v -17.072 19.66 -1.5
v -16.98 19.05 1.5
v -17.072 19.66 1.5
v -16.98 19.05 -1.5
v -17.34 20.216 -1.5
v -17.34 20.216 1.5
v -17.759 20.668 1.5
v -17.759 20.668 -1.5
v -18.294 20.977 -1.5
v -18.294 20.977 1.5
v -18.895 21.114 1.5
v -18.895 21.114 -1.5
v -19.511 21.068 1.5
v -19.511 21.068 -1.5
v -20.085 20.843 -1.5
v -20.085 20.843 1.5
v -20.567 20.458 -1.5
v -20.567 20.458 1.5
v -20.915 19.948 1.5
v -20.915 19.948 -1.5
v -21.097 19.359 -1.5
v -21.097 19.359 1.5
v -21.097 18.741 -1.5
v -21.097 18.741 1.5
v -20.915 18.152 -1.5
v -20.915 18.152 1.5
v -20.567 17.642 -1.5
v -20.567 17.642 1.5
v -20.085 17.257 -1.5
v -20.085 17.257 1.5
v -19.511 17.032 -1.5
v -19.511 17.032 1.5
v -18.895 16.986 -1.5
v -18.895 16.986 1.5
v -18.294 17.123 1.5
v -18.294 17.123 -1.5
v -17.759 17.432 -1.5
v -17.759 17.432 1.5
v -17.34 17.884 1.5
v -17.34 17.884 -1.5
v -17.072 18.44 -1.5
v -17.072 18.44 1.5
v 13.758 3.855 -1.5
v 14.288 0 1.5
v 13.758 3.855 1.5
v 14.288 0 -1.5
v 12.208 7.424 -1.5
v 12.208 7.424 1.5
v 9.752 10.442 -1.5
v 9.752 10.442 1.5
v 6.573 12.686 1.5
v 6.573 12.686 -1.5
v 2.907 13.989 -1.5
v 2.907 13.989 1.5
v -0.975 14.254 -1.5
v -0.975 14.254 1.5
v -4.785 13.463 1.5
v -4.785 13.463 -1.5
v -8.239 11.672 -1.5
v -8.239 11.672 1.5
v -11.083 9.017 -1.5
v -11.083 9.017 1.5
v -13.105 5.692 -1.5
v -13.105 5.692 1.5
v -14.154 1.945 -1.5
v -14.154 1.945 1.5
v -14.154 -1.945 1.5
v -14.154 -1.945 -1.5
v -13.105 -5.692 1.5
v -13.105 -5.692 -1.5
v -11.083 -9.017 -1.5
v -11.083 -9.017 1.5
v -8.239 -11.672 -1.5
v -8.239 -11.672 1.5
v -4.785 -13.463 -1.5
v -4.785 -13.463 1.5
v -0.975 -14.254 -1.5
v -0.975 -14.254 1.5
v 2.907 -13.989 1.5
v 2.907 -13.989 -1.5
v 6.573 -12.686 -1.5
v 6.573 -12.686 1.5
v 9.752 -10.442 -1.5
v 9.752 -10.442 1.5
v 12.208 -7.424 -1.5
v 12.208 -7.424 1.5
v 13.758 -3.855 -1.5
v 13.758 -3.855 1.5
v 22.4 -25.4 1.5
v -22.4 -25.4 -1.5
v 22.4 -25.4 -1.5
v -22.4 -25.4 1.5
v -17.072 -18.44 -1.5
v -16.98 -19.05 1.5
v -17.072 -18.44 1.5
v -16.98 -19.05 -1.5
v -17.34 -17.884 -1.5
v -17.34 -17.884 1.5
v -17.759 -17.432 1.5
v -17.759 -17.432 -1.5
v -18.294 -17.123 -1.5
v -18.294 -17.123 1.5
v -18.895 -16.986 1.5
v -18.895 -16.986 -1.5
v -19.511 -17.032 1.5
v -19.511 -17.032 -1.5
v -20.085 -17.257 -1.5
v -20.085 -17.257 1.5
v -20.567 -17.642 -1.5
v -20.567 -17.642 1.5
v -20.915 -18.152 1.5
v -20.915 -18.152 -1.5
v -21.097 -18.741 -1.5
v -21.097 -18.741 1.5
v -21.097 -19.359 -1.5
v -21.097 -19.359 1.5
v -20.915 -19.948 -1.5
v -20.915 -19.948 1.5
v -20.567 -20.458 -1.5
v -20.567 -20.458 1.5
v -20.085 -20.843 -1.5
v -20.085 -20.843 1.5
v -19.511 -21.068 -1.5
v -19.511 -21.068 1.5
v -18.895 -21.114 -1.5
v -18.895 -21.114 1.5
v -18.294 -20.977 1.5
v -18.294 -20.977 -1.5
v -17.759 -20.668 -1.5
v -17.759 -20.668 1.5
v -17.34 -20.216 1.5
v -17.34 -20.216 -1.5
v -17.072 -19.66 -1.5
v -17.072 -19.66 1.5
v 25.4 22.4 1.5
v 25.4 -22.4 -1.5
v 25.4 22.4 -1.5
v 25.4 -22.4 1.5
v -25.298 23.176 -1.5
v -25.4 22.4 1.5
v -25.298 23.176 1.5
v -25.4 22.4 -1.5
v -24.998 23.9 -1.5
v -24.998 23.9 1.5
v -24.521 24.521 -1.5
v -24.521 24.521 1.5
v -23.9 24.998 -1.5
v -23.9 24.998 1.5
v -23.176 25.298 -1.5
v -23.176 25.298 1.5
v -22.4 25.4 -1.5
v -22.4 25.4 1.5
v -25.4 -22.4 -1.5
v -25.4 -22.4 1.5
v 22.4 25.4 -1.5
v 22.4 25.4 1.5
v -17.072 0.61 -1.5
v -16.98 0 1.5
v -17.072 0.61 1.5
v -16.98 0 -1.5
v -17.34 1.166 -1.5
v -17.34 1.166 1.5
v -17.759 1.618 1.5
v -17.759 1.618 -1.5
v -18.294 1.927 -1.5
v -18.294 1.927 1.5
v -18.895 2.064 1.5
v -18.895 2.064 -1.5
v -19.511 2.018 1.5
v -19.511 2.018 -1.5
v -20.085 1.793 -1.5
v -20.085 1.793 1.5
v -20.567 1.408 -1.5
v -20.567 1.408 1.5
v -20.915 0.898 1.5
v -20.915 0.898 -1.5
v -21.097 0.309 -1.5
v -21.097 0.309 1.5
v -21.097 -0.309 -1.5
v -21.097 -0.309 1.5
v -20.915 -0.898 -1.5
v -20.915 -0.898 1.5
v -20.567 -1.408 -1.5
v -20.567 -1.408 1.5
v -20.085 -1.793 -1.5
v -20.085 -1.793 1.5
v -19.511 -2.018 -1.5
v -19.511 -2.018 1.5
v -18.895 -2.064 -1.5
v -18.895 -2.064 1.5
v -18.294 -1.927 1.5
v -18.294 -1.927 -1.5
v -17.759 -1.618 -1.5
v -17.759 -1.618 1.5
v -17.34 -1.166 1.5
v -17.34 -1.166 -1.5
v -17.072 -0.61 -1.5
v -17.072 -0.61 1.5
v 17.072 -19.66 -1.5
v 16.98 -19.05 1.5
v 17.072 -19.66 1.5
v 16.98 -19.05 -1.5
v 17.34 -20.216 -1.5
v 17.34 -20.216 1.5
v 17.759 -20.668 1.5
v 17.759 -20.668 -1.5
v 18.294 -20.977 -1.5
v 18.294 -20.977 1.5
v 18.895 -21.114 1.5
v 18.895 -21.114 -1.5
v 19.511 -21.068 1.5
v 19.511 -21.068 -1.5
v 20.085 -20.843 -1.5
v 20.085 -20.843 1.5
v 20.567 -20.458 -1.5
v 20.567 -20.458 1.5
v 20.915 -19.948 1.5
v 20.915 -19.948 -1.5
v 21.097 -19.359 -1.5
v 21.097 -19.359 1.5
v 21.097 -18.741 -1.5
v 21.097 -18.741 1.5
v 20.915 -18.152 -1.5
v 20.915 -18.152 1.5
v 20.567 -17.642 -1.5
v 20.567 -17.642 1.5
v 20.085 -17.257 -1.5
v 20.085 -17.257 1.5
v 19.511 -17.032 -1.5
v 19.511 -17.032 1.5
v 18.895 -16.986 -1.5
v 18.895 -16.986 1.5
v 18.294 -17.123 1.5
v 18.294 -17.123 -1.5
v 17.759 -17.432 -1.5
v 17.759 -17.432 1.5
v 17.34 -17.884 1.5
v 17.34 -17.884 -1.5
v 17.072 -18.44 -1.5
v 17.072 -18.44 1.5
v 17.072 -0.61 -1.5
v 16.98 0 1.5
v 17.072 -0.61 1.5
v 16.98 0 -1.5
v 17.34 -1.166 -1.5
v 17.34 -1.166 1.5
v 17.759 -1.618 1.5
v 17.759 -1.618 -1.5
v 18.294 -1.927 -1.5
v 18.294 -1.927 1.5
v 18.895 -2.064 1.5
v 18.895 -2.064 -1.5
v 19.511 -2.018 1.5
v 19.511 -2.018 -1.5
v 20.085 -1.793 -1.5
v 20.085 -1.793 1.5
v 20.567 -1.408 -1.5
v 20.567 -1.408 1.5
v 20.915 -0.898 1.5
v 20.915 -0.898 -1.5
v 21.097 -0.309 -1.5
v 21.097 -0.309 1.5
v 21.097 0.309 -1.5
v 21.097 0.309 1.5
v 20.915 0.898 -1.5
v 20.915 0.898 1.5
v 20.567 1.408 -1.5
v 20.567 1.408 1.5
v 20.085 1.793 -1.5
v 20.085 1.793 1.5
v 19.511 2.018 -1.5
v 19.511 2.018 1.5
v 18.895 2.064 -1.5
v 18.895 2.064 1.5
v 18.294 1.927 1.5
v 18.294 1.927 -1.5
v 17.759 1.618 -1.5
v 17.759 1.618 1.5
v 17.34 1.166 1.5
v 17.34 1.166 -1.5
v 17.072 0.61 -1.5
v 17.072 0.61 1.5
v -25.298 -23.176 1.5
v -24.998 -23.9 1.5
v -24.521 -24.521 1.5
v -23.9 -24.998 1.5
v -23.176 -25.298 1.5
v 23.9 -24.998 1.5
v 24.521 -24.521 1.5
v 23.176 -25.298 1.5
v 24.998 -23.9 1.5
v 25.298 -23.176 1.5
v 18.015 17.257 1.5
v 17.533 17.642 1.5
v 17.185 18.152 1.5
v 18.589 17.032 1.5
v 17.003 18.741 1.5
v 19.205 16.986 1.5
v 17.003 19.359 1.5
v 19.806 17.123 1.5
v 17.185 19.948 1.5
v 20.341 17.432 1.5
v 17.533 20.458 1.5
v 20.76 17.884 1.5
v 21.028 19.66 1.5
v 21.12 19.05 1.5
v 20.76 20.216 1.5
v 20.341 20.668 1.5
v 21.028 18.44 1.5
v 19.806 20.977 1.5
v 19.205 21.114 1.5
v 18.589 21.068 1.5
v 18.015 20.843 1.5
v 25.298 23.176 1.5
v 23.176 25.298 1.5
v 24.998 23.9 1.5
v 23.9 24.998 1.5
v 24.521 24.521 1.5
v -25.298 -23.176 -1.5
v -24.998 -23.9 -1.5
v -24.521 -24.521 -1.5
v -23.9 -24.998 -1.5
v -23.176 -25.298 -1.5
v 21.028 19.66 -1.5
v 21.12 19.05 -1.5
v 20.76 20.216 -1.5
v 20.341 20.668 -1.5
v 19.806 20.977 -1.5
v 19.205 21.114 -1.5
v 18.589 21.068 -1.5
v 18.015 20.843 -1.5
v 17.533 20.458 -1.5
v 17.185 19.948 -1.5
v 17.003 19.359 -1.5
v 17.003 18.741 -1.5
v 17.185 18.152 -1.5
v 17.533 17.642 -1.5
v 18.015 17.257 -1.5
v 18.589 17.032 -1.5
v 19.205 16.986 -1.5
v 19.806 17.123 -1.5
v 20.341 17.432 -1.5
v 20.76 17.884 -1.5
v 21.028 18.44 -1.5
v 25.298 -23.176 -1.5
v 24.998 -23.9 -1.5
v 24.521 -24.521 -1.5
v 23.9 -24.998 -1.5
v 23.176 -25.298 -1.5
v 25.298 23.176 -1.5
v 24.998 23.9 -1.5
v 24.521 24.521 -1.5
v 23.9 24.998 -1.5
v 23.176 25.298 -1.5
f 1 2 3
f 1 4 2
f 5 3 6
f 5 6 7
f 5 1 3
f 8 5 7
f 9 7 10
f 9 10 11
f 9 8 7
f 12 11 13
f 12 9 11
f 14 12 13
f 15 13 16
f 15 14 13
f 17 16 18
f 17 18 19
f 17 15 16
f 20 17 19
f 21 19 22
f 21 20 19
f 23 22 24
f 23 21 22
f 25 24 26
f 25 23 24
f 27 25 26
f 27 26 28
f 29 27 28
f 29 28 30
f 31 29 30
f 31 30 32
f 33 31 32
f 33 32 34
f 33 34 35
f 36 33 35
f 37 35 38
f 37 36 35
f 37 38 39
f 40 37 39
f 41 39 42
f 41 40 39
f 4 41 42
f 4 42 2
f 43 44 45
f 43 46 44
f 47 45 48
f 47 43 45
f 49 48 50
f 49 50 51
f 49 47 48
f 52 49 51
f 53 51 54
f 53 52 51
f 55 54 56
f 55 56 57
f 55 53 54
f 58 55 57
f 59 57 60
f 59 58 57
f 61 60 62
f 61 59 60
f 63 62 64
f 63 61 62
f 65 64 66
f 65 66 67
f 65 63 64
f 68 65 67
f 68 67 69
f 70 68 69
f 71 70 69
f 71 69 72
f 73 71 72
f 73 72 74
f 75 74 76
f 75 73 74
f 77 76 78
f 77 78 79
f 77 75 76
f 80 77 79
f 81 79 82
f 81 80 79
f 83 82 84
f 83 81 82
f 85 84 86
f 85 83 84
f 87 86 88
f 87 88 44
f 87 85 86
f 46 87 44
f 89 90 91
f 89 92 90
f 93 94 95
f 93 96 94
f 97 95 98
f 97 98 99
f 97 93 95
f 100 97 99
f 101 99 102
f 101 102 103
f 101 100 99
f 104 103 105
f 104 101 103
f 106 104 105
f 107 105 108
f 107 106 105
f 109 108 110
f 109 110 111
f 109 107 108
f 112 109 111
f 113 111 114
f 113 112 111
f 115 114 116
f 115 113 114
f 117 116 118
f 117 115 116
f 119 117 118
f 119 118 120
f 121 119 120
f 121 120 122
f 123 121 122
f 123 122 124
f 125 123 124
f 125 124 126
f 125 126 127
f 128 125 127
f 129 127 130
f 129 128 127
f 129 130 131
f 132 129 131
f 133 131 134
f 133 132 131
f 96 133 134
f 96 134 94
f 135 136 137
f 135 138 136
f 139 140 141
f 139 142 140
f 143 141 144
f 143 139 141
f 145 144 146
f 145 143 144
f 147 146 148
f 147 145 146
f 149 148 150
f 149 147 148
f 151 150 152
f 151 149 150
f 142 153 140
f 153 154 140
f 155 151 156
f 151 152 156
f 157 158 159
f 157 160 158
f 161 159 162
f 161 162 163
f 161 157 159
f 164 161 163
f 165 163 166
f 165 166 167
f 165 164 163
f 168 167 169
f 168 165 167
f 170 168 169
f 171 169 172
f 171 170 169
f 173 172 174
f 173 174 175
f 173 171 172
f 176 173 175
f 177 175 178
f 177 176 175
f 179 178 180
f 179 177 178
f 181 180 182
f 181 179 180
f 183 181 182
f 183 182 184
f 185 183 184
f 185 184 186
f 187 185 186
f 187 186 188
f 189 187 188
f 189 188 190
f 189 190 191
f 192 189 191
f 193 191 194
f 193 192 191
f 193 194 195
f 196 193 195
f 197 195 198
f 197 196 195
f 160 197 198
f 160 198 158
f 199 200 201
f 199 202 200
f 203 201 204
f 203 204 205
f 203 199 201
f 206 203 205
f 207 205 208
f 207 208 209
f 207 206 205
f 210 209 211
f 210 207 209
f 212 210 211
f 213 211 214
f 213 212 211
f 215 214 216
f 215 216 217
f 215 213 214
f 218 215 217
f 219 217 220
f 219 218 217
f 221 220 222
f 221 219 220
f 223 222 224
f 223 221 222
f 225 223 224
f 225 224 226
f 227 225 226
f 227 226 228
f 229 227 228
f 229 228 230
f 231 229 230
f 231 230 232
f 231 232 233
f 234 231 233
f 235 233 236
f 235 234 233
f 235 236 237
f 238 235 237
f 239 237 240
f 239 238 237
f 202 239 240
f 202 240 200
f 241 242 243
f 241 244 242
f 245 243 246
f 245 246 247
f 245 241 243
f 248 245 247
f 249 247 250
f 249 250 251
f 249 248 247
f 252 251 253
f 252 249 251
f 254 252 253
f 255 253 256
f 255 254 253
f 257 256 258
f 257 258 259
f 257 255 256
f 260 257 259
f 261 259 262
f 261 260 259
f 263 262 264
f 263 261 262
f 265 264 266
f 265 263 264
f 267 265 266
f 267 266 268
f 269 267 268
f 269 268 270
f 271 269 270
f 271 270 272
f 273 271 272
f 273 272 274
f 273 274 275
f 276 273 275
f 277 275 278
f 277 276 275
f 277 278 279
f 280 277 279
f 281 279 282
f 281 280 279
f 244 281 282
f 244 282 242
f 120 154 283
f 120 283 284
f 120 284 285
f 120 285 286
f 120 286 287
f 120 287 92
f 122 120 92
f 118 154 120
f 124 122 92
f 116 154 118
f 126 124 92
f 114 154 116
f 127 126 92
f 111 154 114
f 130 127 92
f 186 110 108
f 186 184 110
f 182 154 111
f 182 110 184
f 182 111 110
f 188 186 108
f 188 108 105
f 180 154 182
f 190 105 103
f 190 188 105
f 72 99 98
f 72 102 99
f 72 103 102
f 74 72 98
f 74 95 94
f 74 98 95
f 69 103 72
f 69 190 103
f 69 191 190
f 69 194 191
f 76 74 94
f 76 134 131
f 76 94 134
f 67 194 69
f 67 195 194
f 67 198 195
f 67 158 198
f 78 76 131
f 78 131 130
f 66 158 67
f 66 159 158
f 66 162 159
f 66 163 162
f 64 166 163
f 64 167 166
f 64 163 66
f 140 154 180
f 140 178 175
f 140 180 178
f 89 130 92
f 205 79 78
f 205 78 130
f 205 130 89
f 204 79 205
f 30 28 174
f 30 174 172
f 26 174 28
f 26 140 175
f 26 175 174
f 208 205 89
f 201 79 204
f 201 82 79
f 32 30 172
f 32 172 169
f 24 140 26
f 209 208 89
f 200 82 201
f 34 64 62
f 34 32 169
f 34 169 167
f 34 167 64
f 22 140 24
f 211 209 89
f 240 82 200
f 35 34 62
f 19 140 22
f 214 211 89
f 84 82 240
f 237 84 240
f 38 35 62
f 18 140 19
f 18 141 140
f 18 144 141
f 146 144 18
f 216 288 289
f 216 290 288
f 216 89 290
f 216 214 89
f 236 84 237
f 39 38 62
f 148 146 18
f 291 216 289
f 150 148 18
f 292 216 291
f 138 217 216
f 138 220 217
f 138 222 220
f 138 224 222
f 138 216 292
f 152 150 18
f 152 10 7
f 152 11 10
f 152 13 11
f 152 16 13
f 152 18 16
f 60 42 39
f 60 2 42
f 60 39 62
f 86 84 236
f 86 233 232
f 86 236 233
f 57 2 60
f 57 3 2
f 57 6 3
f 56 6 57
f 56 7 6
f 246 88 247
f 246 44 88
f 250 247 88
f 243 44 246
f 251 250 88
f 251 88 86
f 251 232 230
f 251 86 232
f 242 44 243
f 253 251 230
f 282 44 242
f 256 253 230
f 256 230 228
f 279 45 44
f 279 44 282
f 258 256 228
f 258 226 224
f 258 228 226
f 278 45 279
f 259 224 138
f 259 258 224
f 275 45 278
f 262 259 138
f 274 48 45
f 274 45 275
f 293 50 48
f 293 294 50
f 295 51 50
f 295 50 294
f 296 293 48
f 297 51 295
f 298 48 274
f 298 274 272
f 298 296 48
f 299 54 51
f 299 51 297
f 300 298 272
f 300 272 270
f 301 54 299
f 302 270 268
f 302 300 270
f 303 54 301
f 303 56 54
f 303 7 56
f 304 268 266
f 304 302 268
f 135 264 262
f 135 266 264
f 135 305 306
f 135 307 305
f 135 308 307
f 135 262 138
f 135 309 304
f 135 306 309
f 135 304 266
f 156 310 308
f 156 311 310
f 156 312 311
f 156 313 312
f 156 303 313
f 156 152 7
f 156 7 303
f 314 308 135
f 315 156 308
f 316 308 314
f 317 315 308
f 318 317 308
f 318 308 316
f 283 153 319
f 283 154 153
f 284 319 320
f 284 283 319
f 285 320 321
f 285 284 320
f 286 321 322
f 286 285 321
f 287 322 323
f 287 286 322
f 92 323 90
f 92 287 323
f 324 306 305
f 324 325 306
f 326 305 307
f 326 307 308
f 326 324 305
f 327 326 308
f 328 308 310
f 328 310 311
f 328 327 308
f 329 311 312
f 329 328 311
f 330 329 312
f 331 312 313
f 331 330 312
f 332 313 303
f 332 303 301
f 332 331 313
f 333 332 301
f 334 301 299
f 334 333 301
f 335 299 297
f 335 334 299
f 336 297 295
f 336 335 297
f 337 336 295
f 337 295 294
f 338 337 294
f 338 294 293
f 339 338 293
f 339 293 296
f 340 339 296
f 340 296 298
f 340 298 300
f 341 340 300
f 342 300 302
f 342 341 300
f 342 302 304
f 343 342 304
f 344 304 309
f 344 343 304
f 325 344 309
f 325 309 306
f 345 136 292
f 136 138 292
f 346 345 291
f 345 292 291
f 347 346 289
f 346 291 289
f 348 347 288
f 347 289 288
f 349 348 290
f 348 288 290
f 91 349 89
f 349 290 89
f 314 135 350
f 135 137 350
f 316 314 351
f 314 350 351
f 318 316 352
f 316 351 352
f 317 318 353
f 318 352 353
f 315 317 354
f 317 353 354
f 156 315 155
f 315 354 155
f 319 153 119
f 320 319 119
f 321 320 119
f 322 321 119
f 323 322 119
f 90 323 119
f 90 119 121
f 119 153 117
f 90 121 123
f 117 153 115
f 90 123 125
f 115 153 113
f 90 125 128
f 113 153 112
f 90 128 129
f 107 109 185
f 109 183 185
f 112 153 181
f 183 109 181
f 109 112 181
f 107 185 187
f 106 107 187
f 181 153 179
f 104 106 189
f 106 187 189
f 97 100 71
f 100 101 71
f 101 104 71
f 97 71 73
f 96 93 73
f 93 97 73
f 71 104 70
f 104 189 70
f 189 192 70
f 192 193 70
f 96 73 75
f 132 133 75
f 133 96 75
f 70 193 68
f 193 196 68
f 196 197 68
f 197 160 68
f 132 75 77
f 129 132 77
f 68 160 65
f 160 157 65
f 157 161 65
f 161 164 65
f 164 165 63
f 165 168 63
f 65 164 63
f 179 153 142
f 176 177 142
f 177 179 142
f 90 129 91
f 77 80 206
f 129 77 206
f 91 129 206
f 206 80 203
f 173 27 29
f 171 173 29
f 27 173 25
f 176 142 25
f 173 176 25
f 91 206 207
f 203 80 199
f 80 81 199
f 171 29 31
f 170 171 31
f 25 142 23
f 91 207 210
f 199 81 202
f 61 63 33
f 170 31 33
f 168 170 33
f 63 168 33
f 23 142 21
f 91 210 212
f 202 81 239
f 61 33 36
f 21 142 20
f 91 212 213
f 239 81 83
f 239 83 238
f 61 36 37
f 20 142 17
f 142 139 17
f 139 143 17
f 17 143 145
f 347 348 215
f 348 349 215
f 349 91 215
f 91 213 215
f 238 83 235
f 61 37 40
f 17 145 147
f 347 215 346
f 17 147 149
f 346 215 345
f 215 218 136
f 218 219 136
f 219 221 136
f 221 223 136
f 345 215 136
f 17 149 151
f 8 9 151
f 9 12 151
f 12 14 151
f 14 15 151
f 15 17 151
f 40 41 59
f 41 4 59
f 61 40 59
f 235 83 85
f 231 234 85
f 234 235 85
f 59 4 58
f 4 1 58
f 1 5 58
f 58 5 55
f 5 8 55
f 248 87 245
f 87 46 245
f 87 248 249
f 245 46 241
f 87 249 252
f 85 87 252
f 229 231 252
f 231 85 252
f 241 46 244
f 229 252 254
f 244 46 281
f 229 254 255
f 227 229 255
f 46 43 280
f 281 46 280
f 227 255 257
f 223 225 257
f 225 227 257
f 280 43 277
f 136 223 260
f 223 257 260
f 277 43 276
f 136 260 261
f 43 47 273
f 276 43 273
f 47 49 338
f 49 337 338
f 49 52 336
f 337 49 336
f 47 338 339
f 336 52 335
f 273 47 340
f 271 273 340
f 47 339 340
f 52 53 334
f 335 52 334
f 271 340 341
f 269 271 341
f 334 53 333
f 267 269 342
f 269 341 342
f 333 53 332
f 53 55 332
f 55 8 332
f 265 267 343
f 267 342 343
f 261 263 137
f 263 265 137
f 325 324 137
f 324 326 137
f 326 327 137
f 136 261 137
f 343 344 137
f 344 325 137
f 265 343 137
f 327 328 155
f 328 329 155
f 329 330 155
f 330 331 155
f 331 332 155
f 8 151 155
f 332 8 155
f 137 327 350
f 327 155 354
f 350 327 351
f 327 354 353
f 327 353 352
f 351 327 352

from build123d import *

# Parameters (mm, degrees)
SKETCH1_W           = 50.8
SKETCH1_H           = 50.8
SKETCH1_R           = 14.2875
SKETCH1_R_2         = 2.07
BOSS_EXTRUDE1_DEPTH = 1.5
FILLET1_R           = 3


with BuildPart() as part:
    # Sketch1 → Boss-Extrude1 (new, symmetric)
    with BuildSketch(Plane.XY):
        Rectangle(SKETCH1_W, SKETCH1_H)
        Circle(SKETCH1_R, mode=Mode.SUBTRACT)
        with Locations((-19.05, 19.05)):
            Circle(SKETCH1_R_2, mode=Mode.SUBTRACT)
        with Locations(Location((19.05, -19.05, 0), (0, 0, 180))):
            Circle(SKETCH1_R_2, mode=Mode.SUBTRACT)
        with Locations((19.05, 19.05)):
            Circle(SKETCH1_R_2, mode=Mode.SUBTRACT)
        with Locations((-19.05, -19.05)):
            Circle(SKETCH1_R_2, mode=Mode.SUBTRACT)
        with Locations((-19.05, 0)):
            Circle(SKETCH1_R_2, mode=Mode.SUBTRACT)
        with Locations(Location((19.05, 0, 0), (0, 0, 180))):
            Circle(SKETCH1_R_2, mode=Mode.SUBTRACT)
    extrude(amount=BOSS_EXTRUDE1_DEPTH, both=True)

    # Fillet1
    fillet1_edges = [part.edges().sort_by_distance(p)[0] for p in [
        (25.4, -25.4, 0),
        (-25.4, -25.4, 0),
        (-25.4, 25.4, 0),
        (25.4, 25.4, 0),
    ]]
    fillet(fillet1_edges, radius=FILLET1_R)


solid = part.part
